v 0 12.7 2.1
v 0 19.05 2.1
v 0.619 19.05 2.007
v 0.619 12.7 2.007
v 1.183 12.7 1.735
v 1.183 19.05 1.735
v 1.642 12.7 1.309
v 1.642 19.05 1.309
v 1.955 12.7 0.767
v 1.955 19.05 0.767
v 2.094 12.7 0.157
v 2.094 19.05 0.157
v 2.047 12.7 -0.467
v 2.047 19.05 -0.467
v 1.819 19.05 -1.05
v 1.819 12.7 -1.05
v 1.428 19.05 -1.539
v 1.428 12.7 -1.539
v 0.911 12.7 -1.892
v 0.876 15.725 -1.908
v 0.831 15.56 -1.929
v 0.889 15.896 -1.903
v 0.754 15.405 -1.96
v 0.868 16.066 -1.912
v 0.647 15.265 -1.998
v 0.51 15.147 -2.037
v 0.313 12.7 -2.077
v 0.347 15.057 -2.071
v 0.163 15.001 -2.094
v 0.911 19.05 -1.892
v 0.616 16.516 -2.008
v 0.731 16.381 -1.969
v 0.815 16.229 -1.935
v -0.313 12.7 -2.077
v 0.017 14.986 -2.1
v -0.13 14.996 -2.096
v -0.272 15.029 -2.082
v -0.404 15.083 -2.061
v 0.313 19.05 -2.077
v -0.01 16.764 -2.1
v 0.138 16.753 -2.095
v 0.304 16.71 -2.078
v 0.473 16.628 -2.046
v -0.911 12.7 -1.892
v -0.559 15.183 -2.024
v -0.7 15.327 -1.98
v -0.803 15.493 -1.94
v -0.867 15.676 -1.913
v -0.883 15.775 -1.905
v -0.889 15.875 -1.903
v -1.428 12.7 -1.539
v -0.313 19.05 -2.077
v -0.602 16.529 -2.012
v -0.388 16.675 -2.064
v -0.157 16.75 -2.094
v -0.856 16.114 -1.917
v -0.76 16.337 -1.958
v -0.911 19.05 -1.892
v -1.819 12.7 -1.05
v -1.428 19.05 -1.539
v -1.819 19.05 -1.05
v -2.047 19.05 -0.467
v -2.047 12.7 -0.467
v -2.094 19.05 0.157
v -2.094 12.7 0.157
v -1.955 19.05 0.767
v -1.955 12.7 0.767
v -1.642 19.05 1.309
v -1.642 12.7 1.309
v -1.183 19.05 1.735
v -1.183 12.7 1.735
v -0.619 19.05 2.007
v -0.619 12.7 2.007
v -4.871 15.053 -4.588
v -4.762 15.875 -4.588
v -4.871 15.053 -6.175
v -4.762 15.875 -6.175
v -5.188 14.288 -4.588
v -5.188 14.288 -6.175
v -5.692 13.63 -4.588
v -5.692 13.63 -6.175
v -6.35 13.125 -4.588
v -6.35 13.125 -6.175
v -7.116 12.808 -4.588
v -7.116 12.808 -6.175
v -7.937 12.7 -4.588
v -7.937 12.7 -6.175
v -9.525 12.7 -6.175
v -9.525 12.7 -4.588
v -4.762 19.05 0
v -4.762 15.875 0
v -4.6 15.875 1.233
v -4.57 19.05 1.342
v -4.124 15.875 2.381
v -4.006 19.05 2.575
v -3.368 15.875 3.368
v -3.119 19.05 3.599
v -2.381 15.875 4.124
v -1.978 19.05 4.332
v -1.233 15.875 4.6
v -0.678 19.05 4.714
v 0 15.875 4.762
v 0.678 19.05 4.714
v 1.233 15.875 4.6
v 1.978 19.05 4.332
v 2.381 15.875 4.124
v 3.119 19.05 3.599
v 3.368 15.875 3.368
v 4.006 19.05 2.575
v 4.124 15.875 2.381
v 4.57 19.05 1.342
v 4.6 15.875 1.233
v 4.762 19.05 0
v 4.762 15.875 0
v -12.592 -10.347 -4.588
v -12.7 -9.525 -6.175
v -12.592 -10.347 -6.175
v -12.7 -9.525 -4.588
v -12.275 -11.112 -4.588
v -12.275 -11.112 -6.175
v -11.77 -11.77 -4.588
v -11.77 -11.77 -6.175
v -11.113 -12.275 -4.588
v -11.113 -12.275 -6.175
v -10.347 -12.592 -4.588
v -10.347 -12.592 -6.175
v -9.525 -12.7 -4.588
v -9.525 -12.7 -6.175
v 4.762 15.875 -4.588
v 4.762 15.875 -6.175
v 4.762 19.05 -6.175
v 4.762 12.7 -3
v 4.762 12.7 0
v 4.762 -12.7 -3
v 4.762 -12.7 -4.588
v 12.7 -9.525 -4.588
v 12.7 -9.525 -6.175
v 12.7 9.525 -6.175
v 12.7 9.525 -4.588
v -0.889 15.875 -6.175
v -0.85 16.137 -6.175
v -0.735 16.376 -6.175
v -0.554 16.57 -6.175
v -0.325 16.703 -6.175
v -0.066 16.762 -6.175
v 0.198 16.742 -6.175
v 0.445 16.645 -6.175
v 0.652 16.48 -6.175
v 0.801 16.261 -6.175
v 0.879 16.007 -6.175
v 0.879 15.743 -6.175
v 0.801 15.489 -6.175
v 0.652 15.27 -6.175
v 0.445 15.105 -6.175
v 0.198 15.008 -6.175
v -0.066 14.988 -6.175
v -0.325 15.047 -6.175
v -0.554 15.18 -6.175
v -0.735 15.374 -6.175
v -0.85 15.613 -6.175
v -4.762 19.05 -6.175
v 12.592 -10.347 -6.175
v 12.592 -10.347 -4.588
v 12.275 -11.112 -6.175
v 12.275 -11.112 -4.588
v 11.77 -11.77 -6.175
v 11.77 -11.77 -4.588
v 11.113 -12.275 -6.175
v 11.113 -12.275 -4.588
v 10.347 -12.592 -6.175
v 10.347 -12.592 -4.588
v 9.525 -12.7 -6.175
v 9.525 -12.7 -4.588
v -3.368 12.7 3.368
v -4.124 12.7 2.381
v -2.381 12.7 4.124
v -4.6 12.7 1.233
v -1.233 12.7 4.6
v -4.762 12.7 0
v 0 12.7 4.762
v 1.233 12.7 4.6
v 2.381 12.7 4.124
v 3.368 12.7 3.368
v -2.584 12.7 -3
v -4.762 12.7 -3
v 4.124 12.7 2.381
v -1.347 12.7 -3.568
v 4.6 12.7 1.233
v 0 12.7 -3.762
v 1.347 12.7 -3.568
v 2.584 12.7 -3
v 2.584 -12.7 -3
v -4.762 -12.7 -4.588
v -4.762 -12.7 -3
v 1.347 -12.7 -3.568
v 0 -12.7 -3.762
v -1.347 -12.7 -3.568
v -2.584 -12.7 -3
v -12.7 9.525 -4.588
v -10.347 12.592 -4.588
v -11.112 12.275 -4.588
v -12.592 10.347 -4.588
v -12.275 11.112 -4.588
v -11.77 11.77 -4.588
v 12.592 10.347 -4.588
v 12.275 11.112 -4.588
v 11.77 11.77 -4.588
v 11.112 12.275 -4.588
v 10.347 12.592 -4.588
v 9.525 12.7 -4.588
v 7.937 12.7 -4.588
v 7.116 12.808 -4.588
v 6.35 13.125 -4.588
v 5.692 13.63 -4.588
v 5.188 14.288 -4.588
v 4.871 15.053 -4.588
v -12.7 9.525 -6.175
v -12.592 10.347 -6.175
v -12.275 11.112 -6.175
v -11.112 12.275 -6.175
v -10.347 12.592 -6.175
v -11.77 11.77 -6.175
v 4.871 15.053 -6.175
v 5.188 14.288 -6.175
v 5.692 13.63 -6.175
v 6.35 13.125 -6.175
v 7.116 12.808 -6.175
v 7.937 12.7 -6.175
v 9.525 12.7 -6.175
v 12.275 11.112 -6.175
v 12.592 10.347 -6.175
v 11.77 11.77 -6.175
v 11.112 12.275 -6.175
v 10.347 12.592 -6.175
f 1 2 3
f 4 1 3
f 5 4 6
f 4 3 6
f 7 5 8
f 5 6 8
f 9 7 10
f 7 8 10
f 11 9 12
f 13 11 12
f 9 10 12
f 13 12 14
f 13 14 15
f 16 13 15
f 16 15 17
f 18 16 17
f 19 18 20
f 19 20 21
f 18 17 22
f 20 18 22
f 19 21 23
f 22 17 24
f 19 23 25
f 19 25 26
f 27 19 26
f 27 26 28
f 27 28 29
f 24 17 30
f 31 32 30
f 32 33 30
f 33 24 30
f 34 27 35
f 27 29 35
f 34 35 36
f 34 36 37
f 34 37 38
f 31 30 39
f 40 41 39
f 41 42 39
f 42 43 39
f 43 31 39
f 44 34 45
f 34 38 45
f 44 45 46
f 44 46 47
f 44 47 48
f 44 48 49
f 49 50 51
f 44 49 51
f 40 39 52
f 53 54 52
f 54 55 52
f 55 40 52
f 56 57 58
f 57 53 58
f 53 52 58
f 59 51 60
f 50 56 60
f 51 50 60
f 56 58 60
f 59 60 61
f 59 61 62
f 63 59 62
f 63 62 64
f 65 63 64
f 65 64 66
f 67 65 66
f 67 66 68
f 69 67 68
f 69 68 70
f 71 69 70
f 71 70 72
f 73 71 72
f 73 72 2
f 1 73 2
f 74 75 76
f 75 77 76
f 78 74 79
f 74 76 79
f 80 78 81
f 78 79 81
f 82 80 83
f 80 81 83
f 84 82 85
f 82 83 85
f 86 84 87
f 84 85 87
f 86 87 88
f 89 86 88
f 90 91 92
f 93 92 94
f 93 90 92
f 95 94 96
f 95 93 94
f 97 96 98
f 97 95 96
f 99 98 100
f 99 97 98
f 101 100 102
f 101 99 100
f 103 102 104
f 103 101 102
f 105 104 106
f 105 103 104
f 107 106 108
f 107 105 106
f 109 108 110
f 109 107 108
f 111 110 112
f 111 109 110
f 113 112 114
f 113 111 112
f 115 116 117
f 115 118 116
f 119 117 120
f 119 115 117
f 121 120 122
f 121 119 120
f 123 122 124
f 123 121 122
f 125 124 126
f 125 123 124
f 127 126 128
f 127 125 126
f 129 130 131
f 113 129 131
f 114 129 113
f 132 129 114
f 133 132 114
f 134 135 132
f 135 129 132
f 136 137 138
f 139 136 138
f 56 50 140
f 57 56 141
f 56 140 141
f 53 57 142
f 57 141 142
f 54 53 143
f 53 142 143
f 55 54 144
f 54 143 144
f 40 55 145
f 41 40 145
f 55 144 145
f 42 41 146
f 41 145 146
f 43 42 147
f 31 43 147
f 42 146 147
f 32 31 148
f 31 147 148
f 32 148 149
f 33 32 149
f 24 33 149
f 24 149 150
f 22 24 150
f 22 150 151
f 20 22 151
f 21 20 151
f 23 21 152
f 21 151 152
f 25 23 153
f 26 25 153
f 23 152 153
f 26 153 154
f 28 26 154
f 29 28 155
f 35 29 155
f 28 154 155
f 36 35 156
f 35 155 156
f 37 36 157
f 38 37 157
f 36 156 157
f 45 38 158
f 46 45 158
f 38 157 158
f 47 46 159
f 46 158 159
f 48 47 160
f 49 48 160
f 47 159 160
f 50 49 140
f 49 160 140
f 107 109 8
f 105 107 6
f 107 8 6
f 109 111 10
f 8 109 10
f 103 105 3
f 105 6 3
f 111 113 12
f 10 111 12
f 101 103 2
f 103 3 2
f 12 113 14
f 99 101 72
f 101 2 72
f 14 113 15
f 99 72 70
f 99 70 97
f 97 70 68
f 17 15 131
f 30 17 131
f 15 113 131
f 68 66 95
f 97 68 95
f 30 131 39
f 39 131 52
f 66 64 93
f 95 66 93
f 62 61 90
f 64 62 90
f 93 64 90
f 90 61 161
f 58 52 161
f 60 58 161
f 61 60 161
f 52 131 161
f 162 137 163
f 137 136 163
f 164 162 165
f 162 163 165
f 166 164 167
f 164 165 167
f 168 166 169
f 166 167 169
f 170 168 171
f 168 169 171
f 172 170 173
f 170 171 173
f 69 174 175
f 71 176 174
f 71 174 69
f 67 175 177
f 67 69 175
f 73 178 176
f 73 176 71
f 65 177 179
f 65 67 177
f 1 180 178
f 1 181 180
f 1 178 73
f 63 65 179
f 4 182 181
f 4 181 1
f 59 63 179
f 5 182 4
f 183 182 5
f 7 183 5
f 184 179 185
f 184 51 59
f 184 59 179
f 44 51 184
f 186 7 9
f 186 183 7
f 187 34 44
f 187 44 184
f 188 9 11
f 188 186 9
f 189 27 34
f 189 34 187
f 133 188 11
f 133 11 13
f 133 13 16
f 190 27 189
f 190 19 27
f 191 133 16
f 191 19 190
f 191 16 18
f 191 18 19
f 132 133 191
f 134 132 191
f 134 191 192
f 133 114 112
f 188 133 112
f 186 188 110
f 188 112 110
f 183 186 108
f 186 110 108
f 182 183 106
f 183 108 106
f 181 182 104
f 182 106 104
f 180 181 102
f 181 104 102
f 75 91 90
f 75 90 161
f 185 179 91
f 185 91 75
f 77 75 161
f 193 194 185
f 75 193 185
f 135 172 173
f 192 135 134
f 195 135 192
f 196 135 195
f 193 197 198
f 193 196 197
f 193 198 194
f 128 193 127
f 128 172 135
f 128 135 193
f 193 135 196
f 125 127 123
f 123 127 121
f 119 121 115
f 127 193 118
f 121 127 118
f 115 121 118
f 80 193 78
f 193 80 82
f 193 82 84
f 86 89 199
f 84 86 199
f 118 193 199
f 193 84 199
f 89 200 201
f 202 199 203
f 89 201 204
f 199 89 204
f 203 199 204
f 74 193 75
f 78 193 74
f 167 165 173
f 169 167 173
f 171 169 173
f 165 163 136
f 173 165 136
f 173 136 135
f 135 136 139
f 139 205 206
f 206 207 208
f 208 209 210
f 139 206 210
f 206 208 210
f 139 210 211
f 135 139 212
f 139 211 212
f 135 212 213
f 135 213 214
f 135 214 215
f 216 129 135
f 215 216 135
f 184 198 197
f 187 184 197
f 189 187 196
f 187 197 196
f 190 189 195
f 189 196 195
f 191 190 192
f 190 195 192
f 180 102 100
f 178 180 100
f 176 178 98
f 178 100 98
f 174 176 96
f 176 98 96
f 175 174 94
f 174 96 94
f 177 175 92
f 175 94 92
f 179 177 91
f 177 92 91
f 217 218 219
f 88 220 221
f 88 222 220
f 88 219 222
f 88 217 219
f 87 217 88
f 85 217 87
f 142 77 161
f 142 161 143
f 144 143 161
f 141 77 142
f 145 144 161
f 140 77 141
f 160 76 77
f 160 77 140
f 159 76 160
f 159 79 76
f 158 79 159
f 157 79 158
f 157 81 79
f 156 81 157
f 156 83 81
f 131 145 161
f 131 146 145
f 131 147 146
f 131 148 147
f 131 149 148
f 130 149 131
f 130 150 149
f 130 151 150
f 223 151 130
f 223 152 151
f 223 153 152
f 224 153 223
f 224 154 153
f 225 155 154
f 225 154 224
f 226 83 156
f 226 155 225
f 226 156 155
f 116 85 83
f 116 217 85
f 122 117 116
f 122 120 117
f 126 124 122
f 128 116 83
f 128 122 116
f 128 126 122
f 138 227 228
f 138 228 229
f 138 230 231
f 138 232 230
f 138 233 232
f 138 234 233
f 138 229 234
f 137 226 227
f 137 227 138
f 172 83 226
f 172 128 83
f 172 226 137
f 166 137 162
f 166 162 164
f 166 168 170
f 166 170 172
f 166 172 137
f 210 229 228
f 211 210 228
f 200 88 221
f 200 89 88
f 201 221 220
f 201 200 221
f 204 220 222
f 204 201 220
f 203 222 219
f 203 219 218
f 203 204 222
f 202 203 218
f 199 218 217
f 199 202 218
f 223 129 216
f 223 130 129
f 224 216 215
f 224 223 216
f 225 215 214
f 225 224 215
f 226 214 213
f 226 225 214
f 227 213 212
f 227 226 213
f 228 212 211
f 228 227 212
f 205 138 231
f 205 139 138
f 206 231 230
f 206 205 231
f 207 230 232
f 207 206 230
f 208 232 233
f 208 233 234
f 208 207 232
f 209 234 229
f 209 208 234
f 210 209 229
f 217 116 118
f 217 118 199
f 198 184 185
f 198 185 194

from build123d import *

# Parameters (mm, degrees)
BOSS_EXTRUDE1_DEPTH        = 4.7625
SKETCH3_R                  = 2.1
CUT_EXTRUDE1_DEPTH         = 33.69364665
SKETCH4_R                  = 4.7625
CUT_EXTRUDE2_DEPTH         = 25.4
SKETCH5_W                  = 10.115932276
SKETCH5_H                  = 25.4
BOSS_EXTRUDE2_DEPTH        = 1.5875
SKETCH6_OUTSIDE_W          = 35.822
SKETCH6_OUTSIDE_H          = 21.36
SKETCH6_OUTSIDE_R          = 4.7625
CUT_EXTRUDE3_DEPTH         = 3.175
CUT_EXTRUDE4_DEPTH         = 32.87399018
BOSS_EXTRUDE3_DEPTH        = 3.175
FILLET2_R                  = 3.175
F_2_56_TAPPED_HOLE1_REACH  = 27.374
F_2_56_TAPPED_HOLE1_BORE_R = 0.889


with BuildPart() as part:
    # Sketch2 → Boss-Extrude1 (new, symmetric)
    with BuildSketch(Plane(origin=(0, 0, 0), x_dir=(0, 0, -1), z_dir=(1, 0, 0))):
        Polygon((-4.7625, 12.7), (3, 12.7), (3, -12.7), (6.175, -12.7), (6.175, 19.05), (-4.7625, 19.05), align=None)
    extrude(amount=BOSS_EXTRUDE1_DEPTH, both=True)

    # Sketch3 → Cut-Extrude1 (cut, through all)
    with BuildSketch(Plane(origin=(0, 19.05, 0), x_dir=(1, 0, 0), z_dir=(0, 1, 0))):
        with Locations(Location((0, 0, 0), (0, 0, 270))):
            Circle(SKETCH3_R)
    extrude(amount=-CUT_EXTRUDE1_DEPTH, mode=Mode.SUBTRACT)

    # Sketch4 → Cut-Extrude2 (cut)
    with BuildSketch(Plane.XZ.offset(12.7)):
        with Locations((0, 1.0005)):
            Circle(SKETCH4_R)
    extrude(amount=-CUT_EXTRUDE2_DEPTH, mode=Mode.SUBTRACT)

    # Sketch5 → Boss-Extrude2 (add)
    with BuildSketch(Plane(origin=(0, 0, -6.175), x_dir=(-1, 0, 0), z_dir=(0, 0, -1))):
        with Locations((-7.642033862, 0)):
            Rectangle(SKETCH5_W, SKETCH5_H)
        with Locations((7.642033862, 0)):
            Rectangle(SKETCH5_W, SKETCH5_H)
    extrude(amount=-BOSS_EXTRUDE2_DEPTH)

    # Sketch6 outside → Cut-Extrude3 (cut)
    with BuildSketch(Plane(origin=(0, 19.05, 0), x_dir=(1, 0, 0), z_dir=(0, 1, 0))):
        with Locations((0, 0.706)):
            Rectangle(SKETCH6_OUTSIDE_W, SKETCH6_OUTSIDE_H)
        with Locations(Location((0, 0, 0), (0, 0, 270))):
            Circle(SKETCH6_OUTSIDE_R, mode=Mode.SUBTRACT)
    extrude(amount=-CUT_EXTRUDE3_DEPTH, mode=Mode.SUBTRACT)

    # Sketch7 → Cut-Extrude4 (cut, through all)
    with BuildSketch(Plane(origin=(0, 15.875, 0), x_dir=(1, 0, 0), z_dir=(0, 1, 0))):
        with BuildLine():
            ThreePointArc((0, -4.7625), (-3.367596045, -3.367596045), (-4.7625, 0))
            Line((-4.7625, 0), (-4.7625, -4.7625))
            Line((-4.7625, -4.7625), (0, -4.7625))
        make_face()
        with BuildLine():
            ThreePointArc((4.7625, 0), (3.367596045, -3.367596045), (0, -4.7625))
            Line((0, -4.7625), (4.7625, -4.7625))
            Line((4.7625, -4.7625), (4.7625, 0))
        make_face()
    extrude(amount=-CUT_EXTRUDE4_DEPTH, mode=Mode.SUBTRACT)

    # Sketch8 → Boss-Extrude3 (add)
    with BuildSketch(Plane(origin=(0, 15.875, 0), x_dir=(1, 0, 0), z_dir=(0, 1, 0))):
        with BuildLine():
            Line((4.7625, 6.175), (4.7625, 0))
            ThreePointArc((4.7625, 0), (0, 4.7625), (-4.7625, 0))
            Line((-4.7625, 0), (-4.7625, 6.175))
            Line((-4.7625, 6.175), (4.7625, 6.175))
        make_face()
    extrude(amount=BOSS_EXTRUDE3_DEPTH)

    # Fillet2
    fillet2_edges = [part.edges().sort_by_distance(p)[0] for p in [
        (-4.7625, 12.7, -5.38125),
        (-12.7, -12.7, -5.38125),
        (-12.7, 12.7, -5.38125),
        (4.7625, 12.7, -5.38125),
        (12.7, -12.7, -5.38125),
        (12.7, 12.7, -5.38125),
    ]]
    fillet(fillet2_edges, radius=FILLET2_R)

    # #2-56 Tapped Hole1 bore → #2-56 Tapped Hole1 (cut, up to next)
    with BuildSketch(Plane(origin=(0, 0, -6.175), x_dir=(-1, 0, 0), z_dir=(0, 0, -1)), mode=Mode.PRIVATE) as f_2_56_tapped_hole1_sk1:
        with Locations((0, 15.875)):
            Circle(F_2_56_TAPPED_HOLE1_BORE_R)
    f_2_56_tapped_hole1_tool1 = extrude(f_2_56_tapped_hole1_sk1.sketch, amount=-F_2_56_TAPPED_HOLE1_REACH, mode=Mode.PRIVATE) & part.part
    add(f_2_56_tapped_hole1_tool1.solids().sort_by_distance((0, 15.875, -6.175))[0], mode=Mode.SUBTRACT)


solid = part.part
